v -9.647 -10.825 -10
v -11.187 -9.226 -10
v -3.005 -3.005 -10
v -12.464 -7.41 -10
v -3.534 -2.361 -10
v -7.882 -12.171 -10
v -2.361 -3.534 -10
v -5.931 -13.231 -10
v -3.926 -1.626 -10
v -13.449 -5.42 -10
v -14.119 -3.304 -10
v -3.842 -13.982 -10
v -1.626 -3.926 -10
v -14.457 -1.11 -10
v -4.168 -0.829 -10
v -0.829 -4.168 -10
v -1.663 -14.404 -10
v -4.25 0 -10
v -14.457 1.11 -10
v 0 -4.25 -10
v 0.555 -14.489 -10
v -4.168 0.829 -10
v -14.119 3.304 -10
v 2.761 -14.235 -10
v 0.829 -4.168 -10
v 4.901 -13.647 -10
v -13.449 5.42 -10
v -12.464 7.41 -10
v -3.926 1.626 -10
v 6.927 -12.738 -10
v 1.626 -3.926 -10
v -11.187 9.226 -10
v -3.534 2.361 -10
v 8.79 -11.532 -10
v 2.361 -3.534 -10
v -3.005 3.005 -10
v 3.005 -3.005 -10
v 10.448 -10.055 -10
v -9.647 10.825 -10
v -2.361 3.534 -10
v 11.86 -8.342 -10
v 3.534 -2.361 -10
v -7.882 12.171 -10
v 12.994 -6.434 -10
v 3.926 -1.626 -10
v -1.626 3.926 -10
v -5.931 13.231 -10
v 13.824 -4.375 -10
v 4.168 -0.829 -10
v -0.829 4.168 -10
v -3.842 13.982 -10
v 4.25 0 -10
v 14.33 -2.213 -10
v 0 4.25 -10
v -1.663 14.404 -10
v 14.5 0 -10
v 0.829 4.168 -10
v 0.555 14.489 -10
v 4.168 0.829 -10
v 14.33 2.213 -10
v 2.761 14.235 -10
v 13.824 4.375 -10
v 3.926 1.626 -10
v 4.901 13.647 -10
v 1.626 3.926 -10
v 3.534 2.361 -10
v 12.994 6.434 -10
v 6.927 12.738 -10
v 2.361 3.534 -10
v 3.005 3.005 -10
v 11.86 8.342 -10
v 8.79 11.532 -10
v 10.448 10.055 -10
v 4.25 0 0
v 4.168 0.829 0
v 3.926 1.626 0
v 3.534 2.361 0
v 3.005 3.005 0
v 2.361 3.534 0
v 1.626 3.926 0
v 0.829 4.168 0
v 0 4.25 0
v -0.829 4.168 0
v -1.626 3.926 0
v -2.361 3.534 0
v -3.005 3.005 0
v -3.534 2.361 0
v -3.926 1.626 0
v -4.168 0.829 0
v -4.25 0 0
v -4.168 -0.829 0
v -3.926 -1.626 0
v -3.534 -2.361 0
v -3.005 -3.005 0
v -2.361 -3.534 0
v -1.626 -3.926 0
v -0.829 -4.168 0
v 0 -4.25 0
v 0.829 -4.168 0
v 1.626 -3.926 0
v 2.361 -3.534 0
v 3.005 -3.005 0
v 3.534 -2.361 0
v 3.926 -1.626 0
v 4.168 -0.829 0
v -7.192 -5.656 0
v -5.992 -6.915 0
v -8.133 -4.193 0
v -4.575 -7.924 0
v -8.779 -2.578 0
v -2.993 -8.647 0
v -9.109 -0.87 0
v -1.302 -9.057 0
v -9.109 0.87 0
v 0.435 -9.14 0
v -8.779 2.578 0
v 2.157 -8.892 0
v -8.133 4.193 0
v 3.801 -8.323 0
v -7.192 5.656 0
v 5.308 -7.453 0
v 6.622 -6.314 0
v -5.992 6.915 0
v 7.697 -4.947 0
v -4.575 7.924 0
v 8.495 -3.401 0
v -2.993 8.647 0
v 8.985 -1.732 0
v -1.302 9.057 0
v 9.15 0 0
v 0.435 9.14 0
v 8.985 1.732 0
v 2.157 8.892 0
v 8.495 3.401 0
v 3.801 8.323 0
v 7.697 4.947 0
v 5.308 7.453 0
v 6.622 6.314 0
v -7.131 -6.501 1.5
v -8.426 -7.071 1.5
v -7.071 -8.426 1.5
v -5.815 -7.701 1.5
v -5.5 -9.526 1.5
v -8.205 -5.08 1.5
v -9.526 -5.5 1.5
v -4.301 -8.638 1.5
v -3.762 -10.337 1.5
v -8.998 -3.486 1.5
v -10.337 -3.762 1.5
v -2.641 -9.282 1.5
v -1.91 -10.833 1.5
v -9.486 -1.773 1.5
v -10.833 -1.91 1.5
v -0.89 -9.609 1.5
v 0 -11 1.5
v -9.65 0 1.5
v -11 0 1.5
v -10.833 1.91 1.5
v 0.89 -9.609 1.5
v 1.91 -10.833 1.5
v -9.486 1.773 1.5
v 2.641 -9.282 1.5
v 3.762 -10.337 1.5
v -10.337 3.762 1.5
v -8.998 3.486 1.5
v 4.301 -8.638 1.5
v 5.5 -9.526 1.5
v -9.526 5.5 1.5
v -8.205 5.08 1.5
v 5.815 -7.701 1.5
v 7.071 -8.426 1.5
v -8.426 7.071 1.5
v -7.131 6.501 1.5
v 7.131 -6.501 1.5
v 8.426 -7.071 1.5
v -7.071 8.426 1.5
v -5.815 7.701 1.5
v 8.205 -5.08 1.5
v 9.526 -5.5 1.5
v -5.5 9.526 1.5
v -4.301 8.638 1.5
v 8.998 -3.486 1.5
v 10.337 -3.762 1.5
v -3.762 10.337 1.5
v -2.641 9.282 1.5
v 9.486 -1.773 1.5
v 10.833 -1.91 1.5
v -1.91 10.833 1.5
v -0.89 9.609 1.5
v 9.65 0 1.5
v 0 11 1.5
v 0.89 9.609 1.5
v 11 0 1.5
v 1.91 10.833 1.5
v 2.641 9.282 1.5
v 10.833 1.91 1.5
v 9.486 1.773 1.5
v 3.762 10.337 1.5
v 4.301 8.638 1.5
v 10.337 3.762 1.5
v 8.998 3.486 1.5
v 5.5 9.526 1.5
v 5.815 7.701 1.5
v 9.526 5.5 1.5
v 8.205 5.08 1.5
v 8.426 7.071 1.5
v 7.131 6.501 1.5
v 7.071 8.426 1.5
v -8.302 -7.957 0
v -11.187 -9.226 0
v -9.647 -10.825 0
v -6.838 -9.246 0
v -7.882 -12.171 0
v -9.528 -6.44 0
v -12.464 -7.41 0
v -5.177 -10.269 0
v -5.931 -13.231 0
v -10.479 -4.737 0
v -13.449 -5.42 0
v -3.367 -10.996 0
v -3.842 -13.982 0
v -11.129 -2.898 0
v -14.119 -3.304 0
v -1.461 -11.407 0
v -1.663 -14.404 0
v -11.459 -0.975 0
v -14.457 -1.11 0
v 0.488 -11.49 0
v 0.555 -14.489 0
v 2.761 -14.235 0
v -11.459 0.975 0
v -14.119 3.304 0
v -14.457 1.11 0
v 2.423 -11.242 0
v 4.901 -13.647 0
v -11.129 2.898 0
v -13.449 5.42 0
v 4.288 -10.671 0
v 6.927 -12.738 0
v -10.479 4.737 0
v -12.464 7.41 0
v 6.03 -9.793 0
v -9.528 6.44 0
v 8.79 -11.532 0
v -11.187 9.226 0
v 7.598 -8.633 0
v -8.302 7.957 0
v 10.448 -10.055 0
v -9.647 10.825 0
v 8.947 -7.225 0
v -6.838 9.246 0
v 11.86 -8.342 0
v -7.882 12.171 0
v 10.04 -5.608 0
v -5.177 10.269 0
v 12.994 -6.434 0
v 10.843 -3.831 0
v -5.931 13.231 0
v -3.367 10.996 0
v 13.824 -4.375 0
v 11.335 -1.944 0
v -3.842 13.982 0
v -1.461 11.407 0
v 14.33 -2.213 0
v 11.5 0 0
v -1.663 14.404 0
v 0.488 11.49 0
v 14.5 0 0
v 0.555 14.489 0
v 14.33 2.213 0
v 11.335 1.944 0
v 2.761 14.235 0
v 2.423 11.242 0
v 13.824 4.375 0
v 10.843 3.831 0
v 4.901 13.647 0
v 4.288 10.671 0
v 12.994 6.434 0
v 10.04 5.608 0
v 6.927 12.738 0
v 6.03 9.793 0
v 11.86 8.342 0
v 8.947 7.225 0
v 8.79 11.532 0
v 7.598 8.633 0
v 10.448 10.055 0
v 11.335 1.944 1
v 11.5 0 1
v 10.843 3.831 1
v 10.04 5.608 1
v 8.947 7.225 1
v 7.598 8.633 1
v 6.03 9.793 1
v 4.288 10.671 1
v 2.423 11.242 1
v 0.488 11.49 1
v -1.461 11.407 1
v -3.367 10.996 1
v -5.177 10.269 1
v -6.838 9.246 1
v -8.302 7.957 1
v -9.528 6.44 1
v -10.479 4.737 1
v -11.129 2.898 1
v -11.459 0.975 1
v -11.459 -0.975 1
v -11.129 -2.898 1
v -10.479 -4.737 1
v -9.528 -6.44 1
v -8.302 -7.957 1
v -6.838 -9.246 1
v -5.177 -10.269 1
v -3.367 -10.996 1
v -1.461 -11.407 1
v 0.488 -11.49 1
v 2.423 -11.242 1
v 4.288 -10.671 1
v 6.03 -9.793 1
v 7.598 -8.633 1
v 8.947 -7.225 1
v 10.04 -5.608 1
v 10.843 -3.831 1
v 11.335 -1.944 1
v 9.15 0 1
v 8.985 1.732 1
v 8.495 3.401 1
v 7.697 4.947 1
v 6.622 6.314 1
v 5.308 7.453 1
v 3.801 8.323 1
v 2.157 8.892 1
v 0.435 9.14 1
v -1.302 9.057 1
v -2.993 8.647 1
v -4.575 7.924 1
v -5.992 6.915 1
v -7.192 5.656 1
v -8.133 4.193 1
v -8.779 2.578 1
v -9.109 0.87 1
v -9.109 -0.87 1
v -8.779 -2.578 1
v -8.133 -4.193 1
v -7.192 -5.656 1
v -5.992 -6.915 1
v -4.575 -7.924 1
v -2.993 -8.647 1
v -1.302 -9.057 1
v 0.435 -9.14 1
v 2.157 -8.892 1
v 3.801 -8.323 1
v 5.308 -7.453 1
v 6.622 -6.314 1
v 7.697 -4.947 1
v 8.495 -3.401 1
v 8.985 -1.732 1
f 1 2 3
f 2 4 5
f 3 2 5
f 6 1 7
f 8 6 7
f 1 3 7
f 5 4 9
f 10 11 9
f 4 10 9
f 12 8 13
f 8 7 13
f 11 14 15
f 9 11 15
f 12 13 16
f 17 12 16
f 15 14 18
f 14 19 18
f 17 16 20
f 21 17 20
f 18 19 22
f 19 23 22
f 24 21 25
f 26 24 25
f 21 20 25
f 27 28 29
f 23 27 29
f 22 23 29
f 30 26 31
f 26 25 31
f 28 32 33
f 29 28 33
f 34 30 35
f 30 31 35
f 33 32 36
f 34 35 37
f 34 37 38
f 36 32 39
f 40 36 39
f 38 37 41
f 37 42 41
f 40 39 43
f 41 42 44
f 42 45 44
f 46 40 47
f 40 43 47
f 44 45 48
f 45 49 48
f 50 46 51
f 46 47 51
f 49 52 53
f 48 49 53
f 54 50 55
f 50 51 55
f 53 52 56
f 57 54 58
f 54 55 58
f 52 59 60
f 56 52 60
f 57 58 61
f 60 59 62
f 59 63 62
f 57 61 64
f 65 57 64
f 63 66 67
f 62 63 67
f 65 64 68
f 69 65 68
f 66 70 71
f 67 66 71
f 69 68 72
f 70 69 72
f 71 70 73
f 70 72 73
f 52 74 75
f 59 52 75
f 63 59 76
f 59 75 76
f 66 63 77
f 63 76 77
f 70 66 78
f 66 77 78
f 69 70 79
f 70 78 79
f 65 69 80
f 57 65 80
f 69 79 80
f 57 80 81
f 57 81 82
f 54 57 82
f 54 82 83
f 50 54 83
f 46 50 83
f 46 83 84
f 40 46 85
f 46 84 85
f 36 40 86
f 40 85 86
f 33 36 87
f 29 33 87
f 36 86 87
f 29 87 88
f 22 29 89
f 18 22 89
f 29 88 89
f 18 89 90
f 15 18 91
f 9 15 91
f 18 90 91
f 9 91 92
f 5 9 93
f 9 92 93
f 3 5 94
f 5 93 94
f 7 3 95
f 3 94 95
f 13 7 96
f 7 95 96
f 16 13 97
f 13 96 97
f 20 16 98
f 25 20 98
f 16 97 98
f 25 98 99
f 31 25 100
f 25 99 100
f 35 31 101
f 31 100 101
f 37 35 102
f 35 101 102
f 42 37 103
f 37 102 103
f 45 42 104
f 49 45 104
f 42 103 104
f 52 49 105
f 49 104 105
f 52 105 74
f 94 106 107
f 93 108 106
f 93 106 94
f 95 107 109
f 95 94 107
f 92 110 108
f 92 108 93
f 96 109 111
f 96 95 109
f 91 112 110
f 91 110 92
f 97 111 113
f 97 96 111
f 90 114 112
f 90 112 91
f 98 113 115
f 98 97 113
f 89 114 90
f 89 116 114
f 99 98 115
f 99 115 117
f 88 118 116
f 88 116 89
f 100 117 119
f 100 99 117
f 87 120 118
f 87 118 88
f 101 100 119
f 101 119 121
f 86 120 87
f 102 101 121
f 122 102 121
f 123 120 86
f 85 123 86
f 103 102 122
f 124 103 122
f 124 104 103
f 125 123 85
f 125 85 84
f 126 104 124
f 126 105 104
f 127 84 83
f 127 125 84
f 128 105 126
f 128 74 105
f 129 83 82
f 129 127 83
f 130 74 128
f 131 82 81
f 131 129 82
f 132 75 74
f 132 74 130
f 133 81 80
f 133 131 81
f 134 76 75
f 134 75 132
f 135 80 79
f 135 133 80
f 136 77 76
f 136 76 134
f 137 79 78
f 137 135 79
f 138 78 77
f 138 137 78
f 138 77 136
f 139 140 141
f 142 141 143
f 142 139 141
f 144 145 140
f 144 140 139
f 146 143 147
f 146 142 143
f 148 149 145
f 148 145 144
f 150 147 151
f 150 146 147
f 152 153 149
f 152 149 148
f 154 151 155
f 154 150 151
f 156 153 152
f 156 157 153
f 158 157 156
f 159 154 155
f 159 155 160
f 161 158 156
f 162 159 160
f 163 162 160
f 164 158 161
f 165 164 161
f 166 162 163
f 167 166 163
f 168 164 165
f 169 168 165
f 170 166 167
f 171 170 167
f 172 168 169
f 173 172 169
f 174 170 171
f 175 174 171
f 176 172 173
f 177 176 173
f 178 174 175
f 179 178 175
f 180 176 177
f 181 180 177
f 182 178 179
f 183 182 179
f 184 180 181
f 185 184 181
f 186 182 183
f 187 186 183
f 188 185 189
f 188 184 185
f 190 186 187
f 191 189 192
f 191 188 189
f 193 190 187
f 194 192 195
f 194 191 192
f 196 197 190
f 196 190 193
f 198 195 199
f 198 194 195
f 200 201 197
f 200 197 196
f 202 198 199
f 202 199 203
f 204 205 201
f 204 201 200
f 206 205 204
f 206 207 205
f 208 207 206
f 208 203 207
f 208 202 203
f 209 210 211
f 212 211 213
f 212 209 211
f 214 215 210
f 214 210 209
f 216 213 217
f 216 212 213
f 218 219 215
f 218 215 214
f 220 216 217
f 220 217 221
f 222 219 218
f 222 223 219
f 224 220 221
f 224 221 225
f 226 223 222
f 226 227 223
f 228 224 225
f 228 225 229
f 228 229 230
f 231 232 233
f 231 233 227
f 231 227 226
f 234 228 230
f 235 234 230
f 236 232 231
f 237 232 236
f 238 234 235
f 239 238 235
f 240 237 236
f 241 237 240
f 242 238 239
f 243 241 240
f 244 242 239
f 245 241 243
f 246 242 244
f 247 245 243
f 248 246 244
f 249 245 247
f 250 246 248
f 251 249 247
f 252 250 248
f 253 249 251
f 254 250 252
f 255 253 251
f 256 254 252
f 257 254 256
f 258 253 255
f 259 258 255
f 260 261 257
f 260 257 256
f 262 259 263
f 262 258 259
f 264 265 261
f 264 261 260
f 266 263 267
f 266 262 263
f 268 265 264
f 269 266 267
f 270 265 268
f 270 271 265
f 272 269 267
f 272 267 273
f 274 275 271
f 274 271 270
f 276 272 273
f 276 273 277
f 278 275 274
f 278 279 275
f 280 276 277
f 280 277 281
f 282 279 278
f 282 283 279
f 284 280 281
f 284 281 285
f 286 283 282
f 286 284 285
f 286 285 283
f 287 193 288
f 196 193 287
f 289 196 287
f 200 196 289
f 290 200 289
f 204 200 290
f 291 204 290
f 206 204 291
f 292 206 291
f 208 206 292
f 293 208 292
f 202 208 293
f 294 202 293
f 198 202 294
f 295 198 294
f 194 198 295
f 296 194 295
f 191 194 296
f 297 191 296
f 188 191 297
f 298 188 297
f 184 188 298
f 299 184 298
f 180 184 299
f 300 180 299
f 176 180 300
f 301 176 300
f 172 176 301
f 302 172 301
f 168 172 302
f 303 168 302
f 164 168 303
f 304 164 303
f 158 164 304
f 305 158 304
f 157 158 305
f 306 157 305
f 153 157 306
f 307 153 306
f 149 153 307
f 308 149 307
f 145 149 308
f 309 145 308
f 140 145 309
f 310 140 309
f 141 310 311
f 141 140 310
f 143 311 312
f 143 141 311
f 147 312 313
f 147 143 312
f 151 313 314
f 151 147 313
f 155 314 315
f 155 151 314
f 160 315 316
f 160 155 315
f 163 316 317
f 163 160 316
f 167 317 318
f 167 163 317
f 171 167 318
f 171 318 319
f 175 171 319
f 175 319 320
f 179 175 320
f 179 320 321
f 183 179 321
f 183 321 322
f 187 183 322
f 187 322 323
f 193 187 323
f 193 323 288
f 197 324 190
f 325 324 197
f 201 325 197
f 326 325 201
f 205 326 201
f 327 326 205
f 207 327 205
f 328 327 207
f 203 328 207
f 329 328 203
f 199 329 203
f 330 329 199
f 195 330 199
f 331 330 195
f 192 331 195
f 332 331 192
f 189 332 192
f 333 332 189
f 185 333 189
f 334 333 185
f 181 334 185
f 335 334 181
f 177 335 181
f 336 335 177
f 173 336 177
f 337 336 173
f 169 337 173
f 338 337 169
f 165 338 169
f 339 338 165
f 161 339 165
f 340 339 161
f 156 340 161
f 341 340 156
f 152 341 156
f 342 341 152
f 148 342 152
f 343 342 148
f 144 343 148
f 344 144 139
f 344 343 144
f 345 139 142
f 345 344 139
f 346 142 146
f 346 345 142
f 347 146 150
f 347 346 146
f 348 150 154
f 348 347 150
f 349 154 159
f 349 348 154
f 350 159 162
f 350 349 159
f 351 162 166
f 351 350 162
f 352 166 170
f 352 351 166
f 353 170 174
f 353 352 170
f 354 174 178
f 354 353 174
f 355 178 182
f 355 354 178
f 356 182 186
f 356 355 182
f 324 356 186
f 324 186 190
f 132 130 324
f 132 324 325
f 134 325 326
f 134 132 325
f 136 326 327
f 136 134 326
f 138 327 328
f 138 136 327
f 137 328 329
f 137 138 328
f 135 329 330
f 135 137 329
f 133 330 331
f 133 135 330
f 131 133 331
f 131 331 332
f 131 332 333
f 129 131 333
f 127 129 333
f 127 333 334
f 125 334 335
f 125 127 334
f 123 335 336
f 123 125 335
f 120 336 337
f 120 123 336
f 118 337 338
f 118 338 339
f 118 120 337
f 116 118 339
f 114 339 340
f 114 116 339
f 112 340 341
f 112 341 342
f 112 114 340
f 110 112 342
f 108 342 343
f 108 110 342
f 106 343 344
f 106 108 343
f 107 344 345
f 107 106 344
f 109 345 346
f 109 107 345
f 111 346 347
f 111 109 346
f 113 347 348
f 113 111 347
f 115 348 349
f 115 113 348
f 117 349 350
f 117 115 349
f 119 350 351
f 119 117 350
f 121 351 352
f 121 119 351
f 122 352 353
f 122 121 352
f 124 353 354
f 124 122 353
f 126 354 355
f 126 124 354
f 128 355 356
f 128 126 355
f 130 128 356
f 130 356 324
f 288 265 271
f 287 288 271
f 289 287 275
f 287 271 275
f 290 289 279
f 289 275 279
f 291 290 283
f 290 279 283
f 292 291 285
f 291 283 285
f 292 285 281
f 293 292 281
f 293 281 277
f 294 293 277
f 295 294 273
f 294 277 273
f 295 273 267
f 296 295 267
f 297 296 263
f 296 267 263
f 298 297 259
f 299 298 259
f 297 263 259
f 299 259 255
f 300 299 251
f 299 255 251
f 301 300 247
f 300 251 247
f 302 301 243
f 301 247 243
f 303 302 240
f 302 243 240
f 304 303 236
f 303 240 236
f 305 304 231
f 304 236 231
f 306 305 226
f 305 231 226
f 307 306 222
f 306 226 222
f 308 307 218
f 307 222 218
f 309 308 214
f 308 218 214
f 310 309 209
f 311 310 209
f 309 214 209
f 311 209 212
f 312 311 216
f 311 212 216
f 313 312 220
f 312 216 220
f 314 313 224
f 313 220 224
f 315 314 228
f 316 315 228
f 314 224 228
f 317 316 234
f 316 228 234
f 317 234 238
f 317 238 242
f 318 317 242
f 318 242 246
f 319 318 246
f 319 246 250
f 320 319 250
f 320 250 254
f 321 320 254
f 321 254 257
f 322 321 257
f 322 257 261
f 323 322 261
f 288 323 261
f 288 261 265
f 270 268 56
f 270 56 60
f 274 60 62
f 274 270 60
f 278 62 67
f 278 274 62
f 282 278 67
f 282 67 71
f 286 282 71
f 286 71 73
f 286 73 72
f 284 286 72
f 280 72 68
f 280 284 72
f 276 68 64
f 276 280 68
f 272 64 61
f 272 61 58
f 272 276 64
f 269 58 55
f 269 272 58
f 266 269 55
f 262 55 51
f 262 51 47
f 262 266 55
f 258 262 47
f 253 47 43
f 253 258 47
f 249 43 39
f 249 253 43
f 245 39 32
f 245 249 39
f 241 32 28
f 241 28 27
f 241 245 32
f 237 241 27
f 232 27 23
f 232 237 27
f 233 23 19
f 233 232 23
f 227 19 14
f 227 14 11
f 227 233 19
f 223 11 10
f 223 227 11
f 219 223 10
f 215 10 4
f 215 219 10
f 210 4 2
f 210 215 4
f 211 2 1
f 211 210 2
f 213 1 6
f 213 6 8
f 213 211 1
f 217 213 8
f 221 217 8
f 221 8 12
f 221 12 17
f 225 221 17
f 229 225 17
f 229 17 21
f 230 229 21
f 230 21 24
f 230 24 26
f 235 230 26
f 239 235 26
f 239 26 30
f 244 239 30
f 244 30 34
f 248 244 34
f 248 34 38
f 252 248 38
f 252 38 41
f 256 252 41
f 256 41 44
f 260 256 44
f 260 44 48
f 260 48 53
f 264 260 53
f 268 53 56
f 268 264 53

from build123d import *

# Parameters (mm, degrees)
F0_R     = 14.5
F0_R_2   = 11.5
F0_R_3   = 9.15
F0_R_4   = 4.25
F1_DEPTH = 10
F2_DEPTH = 1.5
F3_SIZE  = 0.5


with BuildPart() as f1:
    # F0 (on Top) → F1 (new body)
    with BuildSketch(Plane.XY):
        Circle(F0_R)
        Circle(F0_R_2, mode=Mode.SUBTRACT)
        Circle(F0_R_2)
        Circle(F0_R_3, mode=Mode.SUBTRACT)
        Circle(F0_R_3)
        Circle(F0_R_4, mode=Mode.SUBTRACT)
    extrude(amount=-F1_DEPTH)

    # F0 (on Top) → F2 (join)
    with BuildSketch(Plane.XY):
        Circle(F0_R_2)
        Circle(F0_R_3, mode=Mode.SUBTRACT)
    extrude(amount=F2_DEPTH)

    # F3
    f3_edges = [f1.edges().sort_by_distance(p)[0] for p in [
        (-11.5, 0, 1.5),
        (-9.15, 0, 1.5),
    ]]
    chamfer(f3_edges, length=F3_SIZE)


solid = f1.part
